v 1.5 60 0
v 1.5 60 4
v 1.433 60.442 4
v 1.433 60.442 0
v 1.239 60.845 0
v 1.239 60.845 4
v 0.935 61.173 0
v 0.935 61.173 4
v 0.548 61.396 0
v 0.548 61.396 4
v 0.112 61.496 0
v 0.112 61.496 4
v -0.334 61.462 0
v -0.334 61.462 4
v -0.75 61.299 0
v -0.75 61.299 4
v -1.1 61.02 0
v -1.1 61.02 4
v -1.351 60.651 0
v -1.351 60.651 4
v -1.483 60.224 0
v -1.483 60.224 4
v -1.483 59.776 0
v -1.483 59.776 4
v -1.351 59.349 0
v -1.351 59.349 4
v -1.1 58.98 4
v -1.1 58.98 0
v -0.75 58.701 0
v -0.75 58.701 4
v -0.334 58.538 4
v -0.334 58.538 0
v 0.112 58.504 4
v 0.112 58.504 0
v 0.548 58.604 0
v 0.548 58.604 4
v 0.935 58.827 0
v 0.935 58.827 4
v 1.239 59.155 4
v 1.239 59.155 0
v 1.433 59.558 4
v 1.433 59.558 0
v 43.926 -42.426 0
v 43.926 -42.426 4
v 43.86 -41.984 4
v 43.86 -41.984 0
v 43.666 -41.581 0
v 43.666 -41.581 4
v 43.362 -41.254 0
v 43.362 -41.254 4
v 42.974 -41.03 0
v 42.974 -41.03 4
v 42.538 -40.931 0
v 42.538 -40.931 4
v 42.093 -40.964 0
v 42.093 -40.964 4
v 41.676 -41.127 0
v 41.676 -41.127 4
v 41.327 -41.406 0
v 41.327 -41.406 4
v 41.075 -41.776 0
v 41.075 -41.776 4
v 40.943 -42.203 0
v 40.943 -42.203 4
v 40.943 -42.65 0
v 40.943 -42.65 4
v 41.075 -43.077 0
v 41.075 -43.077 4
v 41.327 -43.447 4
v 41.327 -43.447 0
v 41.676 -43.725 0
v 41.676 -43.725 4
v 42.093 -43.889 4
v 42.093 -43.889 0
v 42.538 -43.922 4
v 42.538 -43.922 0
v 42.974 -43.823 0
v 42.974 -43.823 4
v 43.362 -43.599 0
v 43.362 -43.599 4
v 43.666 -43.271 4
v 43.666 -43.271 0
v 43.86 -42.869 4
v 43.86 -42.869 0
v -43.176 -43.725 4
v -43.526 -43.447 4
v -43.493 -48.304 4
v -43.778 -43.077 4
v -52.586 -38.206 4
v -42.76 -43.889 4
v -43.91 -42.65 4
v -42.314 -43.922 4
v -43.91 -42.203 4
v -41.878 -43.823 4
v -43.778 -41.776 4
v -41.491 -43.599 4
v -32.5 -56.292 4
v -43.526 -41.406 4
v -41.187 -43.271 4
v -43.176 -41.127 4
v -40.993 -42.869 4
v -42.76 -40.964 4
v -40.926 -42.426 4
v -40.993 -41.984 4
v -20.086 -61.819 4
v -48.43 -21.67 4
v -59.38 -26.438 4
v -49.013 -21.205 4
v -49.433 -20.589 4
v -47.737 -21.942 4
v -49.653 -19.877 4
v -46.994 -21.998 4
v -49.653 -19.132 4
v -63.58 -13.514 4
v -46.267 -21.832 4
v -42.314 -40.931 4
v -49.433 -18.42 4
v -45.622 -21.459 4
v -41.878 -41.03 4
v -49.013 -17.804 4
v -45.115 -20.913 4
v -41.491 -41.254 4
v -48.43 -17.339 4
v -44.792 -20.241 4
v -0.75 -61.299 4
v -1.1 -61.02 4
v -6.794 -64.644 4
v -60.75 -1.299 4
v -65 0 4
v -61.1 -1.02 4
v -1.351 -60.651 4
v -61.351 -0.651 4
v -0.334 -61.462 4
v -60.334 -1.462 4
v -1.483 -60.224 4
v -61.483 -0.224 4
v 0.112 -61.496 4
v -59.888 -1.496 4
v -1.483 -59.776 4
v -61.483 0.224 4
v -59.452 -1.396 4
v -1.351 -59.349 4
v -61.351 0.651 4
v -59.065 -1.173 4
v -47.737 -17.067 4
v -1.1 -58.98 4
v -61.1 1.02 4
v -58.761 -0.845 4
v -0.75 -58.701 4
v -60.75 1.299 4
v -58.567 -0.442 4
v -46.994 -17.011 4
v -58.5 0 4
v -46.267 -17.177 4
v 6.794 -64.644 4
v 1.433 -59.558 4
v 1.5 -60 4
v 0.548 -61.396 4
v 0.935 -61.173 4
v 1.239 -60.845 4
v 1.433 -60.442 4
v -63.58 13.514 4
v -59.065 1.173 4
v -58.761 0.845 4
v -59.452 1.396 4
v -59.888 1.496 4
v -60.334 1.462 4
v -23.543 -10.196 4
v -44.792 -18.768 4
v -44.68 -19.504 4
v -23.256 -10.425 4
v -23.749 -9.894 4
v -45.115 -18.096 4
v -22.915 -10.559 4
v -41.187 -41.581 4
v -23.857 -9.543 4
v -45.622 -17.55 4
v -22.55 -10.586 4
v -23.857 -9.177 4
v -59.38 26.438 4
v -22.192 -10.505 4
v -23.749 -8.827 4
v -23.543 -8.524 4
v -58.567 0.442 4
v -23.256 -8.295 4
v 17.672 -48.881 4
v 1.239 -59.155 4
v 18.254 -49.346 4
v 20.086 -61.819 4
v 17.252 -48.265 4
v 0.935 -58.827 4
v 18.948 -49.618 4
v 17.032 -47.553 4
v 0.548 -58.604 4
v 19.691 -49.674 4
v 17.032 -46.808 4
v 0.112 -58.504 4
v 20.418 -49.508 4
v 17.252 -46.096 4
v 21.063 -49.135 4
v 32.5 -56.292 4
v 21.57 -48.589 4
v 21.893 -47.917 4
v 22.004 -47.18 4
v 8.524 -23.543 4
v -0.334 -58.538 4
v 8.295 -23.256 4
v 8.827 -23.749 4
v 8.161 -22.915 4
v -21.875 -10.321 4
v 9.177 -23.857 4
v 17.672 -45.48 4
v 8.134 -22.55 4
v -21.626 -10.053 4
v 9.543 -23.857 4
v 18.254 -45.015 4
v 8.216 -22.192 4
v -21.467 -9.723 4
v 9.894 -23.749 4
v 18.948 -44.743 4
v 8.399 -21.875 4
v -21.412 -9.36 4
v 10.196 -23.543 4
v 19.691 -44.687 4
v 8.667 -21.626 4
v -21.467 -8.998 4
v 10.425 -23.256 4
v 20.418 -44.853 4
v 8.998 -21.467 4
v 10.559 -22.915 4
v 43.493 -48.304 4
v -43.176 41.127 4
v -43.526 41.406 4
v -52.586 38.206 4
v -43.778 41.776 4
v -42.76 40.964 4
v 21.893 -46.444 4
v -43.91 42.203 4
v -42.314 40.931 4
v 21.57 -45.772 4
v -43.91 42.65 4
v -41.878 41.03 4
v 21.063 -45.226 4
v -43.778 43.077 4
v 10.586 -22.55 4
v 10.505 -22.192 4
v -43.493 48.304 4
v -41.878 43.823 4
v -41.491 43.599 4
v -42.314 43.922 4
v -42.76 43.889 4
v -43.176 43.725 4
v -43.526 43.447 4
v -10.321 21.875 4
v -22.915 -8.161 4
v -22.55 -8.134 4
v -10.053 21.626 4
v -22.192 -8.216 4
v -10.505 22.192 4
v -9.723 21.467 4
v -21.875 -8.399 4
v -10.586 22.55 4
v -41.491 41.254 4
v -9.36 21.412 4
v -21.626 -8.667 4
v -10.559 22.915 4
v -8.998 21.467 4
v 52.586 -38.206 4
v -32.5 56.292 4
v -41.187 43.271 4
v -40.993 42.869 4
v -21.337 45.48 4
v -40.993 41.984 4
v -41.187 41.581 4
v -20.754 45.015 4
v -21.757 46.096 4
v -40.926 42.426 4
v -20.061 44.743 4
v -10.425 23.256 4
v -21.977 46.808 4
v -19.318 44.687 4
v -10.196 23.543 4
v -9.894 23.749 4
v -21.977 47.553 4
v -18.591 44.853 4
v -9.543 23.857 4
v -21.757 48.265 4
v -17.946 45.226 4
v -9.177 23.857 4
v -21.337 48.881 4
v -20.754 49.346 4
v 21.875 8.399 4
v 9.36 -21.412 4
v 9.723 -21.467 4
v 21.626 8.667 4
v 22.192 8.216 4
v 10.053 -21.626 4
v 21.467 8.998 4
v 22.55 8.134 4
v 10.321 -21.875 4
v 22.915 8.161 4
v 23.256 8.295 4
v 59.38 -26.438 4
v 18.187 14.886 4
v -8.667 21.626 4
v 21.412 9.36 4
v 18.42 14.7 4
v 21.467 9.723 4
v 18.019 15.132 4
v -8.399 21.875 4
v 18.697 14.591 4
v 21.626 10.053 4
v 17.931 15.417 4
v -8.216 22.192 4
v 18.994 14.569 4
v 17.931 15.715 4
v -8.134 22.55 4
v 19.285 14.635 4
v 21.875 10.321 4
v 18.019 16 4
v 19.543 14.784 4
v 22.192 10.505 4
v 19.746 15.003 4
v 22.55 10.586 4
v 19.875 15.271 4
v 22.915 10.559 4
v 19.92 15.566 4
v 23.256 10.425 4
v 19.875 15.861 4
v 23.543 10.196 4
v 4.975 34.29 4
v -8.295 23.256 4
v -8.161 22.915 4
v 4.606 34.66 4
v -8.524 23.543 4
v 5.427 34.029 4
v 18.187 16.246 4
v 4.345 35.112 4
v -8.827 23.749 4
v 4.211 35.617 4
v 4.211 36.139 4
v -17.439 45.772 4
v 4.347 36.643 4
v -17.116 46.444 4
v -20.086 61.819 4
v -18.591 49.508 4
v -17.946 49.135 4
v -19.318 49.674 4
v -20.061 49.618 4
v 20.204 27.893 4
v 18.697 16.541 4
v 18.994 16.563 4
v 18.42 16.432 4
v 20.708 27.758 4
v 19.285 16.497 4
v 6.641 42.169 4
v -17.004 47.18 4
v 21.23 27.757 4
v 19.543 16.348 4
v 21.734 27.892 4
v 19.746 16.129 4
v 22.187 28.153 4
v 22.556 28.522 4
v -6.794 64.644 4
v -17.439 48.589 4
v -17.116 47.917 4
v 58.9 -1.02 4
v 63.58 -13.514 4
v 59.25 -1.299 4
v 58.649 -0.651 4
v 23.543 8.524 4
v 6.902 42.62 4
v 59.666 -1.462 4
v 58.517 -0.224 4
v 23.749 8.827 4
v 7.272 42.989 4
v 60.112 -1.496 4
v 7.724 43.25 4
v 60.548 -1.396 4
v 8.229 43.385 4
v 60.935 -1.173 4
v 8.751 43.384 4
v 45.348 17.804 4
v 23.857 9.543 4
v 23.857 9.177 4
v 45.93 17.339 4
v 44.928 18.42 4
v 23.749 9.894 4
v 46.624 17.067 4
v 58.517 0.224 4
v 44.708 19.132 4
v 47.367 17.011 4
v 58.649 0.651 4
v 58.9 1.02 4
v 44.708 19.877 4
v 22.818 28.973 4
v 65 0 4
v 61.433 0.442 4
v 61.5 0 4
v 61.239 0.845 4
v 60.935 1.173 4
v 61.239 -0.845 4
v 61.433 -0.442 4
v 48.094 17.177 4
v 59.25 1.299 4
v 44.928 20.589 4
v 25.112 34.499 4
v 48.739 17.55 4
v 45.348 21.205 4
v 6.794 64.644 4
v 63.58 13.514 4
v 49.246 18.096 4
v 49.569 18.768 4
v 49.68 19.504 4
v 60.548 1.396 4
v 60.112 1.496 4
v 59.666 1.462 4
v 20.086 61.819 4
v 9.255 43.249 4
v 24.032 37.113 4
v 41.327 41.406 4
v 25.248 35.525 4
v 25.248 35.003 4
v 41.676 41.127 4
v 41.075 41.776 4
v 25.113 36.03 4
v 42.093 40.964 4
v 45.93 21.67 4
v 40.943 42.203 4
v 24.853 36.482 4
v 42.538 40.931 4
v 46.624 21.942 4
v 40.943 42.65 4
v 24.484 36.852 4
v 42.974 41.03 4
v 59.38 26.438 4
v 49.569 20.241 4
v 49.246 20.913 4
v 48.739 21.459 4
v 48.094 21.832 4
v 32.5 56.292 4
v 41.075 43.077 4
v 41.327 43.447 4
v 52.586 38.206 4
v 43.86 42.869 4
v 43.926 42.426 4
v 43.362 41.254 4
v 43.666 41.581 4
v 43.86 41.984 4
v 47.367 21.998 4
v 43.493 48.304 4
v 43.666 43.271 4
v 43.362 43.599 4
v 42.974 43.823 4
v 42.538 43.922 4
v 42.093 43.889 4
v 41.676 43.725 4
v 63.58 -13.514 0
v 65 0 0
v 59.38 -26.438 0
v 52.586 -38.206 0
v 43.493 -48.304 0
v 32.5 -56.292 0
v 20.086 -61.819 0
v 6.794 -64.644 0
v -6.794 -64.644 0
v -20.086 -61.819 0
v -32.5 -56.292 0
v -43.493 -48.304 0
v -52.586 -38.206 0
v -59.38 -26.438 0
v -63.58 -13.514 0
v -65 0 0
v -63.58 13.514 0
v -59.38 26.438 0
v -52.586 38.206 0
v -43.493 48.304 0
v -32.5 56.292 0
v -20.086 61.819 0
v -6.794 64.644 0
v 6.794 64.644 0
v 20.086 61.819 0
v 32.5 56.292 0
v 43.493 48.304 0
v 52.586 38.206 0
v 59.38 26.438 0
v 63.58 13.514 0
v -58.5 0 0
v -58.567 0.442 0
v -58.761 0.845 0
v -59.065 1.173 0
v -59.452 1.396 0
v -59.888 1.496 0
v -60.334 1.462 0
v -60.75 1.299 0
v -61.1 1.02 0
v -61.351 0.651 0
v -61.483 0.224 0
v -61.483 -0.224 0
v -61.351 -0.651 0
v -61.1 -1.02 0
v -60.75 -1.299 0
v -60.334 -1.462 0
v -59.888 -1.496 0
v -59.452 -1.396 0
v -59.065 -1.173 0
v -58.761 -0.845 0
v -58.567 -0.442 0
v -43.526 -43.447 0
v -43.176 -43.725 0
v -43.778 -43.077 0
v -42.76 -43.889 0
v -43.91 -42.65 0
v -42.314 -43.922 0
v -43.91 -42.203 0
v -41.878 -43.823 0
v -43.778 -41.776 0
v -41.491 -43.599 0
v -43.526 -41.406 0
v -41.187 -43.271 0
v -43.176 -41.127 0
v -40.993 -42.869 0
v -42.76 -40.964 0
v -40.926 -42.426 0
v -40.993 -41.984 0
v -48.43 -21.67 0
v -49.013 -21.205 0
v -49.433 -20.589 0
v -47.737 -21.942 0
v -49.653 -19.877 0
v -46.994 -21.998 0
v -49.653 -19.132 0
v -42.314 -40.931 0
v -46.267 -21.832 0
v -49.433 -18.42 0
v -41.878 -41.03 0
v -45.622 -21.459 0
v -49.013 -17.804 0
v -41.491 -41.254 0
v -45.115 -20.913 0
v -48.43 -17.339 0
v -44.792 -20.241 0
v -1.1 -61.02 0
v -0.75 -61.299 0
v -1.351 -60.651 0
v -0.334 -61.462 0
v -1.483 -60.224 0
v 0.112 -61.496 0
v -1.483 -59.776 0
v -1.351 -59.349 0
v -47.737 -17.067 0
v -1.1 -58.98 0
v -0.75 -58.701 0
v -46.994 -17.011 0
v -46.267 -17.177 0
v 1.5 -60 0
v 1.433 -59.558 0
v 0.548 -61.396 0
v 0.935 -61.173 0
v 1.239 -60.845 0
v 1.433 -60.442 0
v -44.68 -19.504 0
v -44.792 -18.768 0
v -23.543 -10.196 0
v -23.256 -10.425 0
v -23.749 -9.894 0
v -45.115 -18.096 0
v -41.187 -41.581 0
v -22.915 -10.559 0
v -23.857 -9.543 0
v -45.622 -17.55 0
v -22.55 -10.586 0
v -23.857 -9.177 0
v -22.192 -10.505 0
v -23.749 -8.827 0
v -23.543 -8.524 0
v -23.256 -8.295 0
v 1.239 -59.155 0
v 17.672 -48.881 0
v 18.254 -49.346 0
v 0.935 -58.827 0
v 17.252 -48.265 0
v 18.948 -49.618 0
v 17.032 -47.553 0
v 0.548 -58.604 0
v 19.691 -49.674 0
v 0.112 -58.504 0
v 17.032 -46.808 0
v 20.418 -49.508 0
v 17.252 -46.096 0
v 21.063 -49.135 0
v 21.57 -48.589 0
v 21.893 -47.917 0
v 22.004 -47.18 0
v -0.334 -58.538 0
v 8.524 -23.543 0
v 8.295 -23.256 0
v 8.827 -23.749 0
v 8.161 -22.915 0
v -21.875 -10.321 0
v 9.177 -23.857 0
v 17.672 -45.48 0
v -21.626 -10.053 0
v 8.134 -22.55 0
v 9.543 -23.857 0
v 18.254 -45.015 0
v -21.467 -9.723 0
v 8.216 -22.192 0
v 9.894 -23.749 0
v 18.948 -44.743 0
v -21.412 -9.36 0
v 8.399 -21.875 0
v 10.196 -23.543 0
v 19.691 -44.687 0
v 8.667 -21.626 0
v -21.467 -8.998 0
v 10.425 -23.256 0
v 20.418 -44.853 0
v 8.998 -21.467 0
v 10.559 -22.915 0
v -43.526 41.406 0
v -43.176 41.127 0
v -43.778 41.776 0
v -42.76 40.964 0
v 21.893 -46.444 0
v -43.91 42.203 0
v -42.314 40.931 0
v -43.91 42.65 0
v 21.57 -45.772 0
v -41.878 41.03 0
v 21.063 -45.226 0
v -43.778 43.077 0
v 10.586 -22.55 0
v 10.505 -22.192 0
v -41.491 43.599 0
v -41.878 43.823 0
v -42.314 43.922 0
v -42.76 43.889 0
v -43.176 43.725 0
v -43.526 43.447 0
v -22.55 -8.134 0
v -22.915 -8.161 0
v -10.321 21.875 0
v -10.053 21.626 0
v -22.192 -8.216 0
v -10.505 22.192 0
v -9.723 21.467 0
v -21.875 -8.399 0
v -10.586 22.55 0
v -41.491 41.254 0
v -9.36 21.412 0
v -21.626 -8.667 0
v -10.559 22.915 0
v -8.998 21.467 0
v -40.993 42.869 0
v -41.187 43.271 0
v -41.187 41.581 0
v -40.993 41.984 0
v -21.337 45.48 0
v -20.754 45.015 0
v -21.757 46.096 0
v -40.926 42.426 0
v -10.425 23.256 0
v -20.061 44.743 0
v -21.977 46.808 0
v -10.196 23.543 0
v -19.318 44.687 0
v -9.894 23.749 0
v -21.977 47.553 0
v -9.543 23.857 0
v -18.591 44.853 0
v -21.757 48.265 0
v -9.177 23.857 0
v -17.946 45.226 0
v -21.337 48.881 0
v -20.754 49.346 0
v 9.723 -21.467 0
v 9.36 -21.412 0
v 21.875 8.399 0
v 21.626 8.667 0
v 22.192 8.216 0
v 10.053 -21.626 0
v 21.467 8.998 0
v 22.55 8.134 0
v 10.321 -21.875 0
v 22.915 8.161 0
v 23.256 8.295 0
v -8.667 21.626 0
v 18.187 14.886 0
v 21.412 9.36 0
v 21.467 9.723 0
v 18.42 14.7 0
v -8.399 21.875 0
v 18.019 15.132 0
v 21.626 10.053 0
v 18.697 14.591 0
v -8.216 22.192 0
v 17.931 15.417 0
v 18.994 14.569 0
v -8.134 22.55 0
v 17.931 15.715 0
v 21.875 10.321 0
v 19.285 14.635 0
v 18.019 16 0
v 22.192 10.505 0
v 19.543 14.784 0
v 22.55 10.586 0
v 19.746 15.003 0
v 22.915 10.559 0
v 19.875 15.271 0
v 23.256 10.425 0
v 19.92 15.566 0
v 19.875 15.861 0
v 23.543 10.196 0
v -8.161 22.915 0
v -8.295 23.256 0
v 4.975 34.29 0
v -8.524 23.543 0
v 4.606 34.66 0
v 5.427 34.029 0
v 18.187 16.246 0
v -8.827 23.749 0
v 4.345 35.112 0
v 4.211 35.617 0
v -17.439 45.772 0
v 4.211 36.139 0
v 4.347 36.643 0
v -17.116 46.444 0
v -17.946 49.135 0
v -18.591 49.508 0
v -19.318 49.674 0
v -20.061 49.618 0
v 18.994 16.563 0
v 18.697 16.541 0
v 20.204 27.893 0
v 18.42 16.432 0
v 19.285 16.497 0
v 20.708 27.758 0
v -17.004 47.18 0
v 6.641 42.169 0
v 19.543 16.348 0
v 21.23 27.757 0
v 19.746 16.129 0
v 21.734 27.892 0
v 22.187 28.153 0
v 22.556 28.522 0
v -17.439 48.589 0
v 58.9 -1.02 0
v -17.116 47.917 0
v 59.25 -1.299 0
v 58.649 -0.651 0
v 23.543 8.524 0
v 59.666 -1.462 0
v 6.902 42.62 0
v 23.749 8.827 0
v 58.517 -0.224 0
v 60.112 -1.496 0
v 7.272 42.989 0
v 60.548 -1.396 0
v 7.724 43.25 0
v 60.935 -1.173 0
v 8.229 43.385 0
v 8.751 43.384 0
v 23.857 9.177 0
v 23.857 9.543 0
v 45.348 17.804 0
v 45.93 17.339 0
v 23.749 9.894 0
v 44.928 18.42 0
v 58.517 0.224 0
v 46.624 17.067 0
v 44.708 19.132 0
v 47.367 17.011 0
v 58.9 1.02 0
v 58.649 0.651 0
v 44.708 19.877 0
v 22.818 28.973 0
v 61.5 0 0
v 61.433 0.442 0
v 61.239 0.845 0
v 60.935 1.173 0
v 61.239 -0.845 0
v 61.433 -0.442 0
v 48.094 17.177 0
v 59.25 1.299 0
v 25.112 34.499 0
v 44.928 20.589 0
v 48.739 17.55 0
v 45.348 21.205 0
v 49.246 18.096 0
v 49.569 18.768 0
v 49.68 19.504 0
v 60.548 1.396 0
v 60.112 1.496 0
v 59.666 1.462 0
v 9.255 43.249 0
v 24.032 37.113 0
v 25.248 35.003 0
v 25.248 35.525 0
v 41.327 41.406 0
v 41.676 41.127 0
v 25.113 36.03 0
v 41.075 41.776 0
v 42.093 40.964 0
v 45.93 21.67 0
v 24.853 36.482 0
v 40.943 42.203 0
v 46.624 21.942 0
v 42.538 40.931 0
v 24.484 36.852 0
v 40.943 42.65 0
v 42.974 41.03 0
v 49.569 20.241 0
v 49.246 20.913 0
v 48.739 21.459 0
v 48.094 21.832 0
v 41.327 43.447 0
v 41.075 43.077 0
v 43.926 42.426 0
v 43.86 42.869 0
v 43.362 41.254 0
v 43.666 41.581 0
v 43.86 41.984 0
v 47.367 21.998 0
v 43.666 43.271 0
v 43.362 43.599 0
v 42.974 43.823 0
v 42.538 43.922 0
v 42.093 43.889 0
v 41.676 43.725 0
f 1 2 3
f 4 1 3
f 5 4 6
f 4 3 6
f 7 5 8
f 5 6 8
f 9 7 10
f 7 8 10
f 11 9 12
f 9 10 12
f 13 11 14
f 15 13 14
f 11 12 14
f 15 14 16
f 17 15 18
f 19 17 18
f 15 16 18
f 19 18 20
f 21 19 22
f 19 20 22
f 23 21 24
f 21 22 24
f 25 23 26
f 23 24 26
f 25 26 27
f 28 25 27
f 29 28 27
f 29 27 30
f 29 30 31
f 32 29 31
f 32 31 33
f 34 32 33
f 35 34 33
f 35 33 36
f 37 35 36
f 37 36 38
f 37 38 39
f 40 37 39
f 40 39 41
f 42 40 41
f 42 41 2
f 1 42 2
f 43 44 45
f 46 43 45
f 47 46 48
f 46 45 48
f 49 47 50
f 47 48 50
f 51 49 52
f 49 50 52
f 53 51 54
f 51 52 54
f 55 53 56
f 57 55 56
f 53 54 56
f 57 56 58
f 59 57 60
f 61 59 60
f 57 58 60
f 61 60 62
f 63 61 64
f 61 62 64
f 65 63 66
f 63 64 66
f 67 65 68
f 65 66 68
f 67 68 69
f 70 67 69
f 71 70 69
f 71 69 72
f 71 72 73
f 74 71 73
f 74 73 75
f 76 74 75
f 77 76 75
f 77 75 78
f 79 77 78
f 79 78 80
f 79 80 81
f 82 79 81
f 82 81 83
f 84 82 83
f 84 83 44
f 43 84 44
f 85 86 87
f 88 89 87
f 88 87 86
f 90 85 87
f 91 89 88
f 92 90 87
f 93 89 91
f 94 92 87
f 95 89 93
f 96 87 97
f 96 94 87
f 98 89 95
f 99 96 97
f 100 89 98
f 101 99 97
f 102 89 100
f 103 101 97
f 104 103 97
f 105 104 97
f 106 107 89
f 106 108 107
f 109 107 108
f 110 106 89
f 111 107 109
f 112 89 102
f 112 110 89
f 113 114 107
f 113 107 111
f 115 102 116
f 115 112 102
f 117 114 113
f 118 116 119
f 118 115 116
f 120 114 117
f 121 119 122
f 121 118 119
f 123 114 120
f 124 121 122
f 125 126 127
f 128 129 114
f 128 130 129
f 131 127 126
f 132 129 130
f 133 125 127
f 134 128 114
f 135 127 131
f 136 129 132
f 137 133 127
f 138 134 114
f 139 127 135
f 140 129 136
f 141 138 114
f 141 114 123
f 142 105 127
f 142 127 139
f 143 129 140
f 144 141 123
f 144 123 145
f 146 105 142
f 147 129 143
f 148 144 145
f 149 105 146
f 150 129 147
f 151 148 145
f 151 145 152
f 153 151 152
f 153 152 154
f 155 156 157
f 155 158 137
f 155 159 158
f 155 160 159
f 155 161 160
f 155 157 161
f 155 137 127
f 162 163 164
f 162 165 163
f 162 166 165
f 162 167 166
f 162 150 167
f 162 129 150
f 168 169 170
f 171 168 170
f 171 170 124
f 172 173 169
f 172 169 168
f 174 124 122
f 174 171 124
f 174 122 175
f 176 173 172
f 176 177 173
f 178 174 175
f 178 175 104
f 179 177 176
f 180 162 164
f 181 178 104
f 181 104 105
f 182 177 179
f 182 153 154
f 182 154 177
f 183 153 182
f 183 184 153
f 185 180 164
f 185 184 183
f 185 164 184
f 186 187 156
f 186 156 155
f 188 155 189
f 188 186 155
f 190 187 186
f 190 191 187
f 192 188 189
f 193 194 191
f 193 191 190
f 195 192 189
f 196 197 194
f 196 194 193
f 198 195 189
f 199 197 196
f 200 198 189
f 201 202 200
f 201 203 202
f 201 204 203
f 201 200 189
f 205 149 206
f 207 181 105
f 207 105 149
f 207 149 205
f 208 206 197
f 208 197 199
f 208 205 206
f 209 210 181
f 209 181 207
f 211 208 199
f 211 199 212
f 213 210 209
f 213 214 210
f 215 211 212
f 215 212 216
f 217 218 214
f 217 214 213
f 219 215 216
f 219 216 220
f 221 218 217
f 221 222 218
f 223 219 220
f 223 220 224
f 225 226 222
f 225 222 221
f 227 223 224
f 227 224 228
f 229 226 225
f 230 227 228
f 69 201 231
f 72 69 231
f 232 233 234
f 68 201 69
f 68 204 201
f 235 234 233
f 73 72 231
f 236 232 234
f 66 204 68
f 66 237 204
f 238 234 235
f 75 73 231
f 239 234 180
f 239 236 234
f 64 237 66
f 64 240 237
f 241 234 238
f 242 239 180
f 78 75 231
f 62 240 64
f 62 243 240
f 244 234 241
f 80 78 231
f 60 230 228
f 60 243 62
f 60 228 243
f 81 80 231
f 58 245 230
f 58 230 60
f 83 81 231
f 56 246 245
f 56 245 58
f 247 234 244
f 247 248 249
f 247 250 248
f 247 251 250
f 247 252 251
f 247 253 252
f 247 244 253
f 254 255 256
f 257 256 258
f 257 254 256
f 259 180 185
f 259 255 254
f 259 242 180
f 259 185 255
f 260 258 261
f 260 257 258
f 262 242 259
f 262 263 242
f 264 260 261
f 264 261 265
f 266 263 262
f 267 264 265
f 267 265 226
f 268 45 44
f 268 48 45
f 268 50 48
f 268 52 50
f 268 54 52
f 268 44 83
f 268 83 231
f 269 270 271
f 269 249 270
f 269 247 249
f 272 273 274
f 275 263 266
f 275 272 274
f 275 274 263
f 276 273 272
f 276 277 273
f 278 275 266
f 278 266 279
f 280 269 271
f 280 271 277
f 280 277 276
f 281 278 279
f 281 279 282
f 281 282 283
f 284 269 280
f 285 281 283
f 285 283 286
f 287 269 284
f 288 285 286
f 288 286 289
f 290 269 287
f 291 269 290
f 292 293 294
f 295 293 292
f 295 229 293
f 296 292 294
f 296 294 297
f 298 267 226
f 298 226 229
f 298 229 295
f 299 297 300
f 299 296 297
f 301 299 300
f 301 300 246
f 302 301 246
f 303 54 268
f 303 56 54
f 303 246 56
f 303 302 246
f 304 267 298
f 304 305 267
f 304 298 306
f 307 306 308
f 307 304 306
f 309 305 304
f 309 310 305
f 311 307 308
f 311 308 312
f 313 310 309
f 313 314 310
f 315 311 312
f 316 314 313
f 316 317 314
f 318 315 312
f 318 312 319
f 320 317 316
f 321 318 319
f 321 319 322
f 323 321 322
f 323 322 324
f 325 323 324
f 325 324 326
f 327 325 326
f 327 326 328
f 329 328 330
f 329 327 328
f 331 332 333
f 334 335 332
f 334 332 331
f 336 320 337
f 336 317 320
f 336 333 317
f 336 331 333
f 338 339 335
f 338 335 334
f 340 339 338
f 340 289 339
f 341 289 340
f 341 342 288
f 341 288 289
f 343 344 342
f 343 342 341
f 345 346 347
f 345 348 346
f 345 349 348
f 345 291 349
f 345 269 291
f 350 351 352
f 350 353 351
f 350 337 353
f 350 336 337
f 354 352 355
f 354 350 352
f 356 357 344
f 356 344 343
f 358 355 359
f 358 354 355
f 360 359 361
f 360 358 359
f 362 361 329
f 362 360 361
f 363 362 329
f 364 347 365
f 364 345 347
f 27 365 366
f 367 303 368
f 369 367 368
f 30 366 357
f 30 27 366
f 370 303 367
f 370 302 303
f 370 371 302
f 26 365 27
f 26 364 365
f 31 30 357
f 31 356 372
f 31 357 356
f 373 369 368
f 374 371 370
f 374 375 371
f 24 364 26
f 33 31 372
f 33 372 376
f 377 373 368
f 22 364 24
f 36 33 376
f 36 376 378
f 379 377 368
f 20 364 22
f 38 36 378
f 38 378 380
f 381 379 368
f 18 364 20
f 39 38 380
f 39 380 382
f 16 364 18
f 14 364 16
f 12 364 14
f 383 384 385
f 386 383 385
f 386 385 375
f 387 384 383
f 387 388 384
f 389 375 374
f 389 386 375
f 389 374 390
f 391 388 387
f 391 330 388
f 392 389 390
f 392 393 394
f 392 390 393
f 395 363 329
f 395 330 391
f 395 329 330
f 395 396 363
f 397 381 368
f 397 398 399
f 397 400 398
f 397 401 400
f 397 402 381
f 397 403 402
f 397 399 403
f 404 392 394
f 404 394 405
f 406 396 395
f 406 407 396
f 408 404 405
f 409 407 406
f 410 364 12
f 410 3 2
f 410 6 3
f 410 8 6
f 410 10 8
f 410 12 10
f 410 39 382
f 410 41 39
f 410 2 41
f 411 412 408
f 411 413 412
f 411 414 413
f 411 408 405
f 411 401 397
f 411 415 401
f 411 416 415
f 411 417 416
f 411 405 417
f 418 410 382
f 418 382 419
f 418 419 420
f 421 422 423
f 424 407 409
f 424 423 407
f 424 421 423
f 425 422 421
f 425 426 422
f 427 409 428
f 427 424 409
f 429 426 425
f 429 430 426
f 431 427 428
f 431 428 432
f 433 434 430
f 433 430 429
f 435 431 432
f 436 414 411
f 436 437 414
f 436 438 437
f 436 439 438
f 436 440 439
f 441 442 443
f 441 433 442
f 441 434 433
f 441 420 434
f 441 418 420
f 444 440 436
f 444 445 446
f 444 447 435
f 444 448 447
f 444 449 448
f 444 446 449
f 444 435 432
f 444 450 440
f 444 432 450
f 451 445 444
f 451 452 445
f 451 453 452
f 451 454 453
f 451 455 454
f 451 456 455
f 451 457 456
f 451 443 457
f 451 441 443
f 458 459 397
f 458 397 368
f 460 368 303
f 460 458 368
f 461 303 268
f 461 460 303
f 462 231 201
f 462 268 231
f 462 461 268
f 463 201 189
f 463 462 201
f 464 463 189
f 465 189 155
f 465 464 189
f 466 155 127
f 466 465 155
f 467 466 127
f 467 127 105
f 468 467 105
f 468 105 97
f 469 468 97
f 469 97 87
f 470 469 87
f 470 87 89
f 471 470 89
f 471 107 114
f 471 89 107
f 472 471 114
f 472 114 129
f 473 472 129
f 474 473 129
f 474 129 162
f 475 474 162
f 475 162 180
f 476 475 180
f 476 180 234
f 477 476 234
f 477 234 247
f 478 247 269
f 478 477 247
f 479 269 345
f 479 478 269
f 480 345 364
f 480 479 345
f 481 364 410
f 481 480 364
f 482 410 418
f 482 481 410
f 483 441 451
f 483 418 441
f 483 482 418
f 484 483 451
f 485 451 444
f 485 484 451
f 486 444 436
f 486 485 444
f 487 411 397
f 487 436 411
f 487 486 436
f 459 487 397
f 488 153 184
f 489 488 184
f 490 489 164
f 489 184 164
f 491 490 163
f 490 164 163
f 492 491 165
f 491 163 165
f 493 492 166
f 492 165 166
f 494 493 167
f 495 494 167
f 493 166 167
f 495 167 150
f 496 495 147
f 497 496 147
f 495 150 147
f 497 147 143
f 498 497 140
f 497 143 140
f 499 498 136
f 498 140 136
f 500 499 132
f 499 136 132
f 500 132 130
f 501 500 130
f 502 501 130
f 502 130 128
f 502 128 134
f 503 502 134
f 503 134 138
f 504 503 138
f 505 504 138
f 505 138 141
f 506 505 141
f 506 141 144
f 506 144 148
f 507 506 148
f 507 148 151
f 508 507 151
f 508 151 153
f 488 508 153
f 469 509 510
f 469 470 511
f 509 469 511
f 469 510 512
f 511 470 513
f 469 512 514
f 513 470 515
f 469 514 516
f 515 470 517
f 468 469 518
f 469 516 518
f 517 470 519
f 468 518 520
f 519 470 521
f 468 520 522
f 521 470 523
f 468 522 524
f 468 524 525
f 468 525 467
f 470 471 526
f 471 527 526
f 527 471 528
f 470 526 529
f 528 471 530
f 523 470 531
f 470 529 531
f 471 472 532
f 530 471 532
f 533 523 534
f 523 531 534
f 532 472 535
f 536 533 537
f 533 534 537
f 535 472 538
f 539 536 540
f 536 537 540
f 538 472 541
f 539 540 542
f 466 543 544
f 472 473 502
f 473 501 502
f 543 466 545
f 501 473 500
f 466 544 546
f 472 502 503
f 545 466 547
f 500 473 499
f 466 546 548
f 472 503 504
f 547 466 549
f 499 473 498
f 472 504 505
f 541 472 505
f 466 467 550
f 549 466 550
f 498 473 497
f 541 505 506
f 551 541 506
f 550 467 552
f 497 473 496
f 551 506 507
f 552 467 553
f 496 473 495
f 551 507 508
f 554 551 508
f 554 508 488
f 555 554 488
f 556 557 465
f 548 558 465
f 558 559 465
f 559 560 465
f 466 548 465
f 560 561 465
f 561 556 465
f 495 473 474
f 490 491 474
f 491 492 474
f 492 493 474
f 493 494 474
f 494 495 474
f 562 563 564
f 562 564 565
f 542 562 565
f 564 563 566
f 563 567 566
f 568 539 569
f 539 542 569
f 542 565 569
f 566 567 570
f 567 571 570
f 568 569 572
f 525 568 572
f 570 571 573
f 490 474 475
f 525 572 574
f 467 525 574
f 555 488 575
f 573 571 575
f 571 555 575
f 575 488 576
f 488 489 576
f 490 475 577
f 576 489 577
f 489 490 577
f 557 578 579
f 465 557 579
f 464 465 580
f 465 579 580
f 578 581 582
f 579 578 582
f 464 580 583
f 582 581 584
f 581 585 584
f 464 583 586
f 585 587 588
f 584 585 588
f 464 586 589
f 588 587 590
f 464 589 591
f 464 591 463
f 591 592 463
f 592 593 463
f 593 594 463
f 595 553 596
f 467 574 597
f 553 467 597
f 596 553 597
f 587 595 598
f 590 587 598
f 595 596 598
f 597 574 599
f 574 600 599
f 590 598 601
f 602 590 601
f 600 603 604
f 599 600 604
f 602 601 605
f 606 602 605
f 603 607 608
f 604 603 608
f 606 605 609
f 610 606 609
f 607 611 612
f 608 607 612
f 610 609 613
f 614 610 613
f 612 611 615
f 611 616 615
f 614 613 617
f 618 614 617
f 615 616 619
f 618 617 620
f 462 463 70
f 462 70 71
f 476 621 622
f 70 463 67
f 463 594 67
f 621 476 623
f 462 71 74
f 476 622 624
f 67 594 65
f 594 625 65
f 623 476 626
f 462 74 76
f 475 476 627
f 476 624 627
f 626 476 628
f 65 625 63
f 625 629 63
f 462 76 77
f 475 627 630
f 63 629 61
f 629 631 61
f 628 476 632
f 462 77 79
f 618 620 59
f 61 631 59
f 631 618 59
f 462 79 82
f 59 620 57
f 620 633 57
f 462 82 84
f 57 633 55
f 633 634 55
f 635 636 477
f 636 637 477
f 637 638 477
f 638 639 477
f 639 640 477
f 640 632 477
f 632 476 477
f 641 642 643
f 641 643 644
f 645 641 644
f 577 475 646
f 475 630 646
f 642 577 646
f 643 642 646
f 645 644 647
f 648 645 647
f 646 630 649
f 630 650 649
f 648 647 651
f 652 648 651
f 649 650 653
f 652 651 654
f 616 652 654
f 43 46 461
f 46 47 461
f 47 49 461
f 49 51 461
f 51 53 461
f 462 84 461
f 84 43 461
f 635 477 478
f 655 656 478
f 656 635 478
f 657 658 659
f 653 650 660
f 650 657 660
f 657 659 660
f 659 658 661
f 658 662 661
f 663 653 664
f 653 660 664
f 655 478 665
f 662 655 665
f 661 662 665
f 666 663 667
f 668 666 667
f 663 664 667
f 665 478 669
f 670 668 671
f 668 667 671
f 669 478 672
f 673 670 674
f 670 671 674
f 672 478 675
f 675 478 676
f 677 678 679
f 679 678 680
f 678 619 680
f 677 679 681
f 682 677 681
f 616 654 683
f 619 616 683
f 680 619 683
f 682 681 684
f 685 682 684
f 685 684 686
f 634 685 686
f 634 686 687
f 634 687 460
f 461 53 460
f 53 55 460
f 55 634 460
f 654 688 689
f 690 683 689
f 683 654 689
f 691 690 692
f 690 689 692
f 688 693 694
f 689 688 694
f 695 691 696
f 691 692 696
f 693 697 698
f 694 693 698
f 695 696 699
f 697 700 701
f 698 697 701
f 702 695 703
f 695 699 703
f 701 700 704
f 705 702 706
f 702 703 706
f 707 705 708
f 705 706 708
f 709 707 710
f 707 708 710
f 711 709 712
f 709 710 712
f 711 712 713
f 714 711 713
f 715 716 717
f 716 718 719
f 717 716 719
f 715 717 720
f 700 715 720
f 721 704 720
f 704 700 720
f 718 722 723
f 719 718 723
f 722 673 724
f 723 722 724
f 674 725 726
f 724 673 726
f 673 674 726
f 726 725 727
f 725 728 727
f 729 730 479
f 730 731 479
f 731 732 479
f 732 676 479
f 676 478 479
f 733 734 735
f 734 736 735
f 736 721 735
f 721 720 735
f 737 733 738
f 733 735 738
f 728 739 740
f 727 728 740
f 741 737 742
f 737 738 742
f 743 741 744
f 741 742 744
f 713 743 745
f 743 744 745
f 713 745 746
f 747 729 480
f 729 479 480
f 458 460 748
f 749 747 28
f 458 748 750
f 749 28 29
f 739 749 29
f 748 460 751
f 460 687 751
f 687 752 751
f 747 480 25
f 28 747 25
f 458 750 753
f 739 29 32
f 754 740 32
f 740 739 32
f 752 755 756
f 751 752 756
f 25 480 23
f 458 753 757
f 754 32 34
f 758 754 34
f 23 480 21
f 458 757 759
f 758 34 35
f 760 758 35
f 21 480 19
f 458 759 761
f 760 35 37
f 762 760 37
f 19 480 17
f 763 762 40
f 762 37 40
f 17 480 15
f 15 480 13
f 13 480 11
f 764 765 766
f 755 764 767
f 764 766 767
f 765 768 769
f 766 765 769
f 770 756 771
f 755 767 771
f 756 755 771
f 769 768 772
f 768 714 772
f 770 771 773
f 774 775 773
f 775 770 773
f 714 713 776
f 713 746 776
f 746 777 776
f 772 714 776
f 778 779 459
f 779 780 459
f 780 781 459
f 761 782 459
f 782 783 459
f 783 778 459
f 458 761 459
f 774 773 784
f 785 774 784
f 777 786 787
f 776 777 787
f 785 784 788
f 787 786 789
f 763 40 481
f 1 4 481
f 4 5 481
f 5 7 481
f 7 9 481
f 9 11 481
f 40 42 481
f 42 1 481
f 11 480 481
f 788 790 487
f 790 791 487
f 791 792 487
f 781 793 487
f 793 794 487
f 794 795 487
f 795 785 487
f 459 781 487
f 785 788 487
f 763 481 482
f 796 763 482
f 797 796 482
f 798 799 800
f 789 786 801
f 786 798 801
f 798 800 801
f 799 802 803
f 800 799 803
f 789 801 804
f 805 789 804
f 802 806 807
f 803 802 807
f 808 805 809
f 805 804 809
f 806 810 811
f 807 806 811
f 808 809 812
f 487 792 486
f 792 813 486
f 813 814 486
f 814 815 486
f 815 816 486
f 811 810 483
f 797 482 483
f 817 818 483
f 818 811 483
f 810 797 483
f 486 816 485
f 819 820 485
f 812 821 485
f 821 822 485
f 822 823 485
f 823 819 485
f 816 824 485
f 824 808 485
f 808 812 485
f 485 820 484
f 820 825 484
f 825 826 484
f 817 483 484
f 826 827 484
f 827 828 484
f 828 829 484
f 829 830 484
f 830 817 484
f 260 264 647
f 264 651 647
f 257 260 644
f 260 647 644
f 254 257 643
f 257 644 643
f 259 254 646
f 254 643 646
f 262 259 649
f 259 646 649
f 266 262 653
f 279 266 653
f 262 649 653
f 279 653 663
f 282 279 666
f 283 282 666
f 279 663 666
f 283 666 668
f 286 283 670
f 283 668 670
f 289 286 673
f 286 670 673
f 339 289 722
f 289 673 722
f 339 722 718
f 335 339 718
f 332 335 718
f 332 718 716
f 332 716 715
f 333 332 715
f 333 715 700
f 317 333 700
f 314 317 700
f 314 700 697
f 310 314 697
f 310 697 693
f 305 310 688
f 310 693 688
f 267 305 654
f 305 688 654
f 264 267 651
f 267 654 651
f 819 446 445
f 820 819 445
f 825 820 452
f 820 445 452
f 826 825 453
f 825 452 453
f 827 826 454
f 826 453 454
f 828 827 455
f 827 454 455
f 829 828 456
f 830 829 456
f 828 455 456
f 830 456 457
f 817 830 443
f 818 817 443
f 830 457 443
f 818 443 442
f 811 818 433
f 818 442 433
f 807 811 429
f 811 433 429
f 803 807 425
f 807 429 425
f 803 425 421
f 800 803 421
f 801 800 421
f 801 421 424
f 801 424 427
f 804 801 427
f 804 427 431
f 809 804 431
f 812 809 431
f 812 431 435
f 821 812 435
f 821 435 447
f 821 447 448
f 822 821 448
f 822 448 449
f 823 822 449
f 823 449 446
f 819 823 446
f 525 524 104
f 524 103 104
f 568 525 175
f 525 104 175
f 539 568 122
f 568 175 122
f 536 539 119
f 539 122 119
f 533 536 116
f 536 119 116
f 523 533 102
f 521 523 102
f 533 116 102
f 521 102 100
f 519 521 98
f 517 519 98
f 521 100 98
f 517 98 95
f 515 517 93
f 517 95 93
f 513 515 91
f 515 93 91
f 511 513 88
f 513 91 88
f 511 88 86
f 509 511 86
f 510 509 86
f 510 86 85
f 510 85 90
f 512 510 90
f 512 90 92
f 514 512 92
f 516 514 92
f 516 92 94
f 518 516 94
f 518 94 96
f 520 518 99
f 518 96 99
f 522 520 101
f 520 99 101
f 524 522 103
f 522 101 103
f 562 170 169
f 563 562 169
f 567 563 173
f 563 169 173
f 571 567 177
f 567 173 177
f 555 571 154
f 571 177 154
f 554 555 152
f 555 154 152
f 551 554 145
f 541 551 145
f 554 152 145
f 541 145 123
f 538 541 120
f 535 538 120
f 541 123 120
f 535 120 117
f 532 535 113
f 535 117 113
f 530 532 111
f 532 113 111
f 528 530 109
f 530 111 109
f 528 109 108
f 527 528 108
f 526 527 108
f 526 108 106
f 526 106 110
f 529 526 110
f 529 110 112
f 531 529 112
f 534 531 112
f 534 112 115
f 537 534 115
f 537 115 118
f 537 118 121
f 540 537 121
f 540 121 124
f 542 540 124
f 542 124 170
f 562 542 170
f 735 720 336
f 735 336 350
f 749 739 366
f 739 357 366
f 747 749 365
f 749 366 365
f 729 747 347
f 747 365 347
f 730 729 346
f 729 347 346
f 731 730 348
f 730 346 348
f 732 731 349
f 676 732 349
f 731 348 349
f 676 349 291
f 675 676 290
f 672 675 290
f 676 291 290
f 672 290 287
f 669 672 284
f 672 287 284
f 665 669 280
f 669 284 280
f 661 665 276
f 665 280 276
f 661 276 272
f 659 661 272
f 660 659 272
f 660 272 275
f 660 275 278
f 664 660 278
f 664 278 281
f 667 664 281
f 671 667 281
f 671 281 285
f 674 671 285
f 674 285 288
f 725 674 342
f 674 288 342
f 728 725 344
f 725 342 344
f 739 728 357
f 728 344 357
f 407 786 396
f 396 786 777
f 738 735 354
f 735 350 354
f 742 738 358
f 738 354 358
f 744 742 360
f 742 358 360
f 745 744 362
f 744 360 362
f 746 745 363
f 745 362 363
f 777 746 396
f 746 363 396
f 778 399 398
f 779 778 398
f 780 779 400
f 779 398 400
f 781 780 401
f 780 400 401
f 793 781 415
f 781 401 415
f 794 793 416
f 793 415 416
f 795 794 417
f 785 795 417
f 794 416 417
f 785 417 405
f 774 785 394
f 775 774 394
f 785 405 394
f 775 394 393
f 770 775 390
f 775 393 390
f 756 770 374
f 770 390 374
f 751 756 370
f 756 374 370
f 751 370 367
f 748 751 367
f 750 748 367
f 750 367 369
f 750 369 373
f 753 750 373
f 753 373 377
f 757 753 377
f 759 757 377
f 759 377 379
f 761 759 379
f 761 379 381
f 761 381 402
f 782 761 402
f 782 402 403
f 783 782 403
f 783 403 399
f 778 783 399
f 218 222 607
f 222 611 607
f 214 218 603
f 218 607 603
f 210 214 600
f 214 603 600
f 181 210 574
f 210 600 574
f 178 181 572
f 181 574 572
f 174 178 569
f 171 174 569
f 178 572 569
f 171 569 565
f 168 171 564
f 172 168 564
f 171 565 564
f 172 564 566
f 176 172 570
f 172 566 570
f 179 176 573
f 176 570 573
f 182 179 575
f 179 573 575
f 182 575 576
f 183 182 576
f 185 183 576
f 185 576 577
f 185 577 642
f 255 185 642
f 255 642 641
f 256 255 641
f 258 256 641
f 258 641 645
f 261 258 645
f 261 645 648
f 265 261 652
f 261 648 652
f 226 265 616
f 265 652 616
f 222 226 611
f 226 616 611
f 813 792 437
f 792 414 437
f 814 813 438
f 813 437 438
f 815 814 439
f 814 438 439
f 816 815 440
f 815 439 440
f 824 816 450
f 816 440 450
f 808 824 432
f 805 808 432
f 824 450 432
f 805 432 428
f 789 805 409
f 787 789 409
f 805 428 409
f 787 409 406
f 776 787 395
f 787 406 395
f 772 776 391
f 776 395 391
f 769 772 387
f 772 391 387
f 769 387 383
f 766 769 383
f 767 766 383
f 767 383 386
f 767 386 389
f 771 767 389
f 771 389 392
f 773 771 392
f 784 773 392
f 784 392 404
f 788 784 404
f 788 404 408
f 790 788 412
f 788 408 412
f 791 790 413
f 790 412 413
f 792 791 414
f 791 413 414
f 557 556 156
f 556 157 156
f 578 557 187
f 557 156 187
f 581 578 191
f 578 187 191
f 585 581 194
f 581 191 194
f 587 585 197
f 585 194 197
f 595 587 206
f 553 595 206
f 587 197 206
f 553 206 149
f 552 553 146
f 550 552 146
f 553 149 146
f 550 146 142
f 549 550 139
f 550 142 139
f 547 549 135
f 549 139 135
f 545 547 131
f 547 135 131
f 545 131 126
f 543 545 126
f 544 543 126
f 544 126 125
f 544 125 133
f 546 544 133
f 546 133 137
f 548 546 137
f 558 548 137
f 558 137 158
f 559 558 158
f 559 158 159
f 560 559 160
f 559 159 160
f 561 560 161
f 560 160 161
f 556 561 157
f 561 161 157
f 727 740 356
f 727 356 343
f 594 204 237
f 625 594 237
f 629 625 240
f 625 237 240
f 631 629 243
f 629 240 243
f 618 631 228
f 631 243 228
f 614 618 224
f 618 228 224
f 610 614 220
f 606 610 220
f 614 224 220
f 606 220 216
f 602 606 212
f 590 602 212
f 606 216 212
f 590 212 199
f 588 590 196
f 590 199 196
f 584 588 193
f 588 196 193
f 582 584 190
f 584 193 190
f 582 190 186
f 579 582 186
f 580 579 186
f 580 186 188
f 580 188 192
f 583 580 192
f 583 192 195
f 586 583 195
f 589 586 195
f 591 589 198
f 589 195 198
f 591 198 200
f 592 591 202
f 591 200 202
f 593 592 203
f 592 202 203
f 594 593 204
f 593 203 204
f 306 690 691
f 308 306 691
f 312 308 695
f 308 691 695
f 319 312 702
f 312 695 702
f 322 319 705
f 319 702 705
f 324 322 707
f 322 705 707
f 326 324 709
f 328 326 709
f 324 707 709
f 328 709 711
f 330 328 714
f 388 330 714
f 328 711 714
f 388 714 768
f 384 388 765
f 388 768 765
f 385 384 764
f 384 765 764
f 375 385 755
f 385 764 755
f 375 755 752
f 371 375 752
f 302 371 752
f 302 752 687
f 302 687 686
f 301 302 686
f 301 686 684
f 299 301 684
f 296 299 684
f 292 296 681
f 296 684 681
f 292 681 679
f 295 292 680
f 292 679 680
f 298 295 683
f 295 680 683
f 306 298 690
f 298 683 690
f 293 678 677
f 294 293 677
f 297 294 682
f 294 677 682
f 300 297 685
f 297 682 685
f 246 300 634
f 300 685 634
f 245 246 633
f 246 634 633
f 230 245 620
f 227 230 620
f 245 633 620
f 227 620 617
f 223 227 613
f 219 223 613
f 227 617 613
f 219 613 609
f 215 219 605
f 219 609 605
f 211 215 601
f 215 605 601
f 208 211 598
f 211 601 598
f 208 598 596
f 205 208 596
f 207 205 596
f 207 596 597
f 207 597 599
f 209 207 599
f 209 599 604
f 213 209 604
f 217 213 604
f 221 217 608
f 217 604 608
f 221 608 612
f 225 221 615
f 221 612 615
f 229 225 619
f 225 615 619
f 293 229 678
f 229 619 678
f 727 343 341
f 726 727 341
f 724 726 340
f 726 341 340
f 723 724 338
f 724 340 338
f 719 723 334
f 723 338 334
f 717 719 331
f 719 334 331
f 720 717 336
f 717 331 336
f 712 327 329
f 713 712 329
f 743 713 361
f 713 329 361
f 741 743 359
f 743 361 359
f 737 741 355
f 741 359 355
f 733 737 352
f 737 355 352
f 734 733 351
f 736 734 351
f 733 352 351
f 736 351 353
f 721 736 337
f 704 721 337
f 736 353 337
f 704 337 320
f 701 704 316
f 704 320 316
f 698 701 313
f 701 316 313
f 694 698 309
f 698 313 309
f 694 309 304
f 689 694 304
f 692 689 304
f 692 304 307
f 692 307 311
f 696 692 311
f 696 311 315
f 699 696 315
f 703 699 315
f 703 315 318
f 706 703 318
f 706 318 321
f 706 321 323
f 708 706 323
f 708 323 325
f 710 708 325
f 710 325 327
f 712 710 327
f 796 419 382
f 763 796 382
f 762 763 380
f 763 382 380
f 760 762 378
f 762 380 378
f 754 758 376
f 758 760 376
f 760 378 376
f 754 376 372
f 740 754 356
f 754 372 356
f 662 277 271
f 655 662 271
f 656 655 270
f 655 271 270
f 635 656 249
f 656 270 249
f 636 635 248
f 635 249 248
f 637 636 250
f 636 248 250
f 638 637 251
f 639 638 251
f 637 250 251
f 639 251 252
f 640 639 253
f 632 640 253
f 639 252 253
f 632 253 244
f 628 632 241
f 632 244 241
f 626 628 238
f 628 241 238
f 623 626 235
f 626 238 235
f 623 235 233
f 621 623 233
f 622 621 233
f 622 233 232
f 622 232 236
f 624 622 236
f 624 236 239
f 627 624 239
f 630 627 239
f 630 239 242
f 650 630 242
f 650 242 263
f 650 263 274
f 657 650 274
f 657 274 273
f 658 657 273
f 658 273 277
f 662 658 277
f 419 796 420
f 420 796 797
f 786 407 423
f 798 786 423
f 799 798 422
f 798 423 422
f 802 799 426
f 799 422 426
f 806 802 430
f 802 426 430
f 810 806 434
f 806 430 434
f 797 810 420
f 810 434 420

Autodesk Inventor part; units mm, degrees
ref_plane "YZ Plane" through (0, 0, 0) normal (1, 0, 0) x (0, 1, 0)
ref_plane "XZ Plane" through (0, 0, 0) normal (0, 1, 0) x (-1, 0, 0)
ref_plane "XY Plane" through (0, 0, 0) normal (0, 0, 1) x (1, 0, 0)
sketch "스케치1" plane through (0, 0, 0) normal (0, 0, 1) x (1, 0, 0)
  line L0 (-18, -16) -> (-18, 16)
  line L1 (-18, 16) -> (18, 16)
  line L2 (18, 16) -> (18, -16)
  line L3 (18, -16) -> (-18, -16)
  circle A0 centre (36.125, 36.075) radius 2.5
  circle A1 centre (-36.125, -36.075) radius 2.5
  circle A2 centre (36.075, -36.125) radius 2.5
  circle A3 centre (-36.075, 36.125) radius 2.5
  arc A4 (-39.6581, -32.537) -> (-32.5919, -39.613) centre (-36.125, -36.075) ccw
  line L4 (-32.5919, -39.613) -> (-17.9206, -24.962)
  arc A5 (-14.3876, -23.5) -> (-17.9206, -24.962) centre (-14.3876, -28.5) ccw
  line L5 (-14.3876, -23.5) -> (14.3282, -23.5)
  arc A6 (17.8662, -24.9669) -> (14.3282, -23.5) centre (14.3282, -28.5) ccw
  line L6 (17.8662, -24.9669) -> (32.537, -39.6581)
  arc A7 (32.537, -39.6581) -> (39.613, -32.5919) centre (36.075, -36.125) ccw
  line L7 (39.613, -32.5919) -> (24.962, -17.9206)
  arc A8 (23.5, -14.3876) -> (24.962, -17.9206) centre (28.5, -14.3876) ccw
  line L8 (23.5, -14.3876) -> (23.5, 14.3282)
  arc A9 (24.9669, 17.8662) -> (23.5, 14.3282) centre (28.5, 14.3282) ccw
  line L9 (24.9669, 17.8662) -> (39.6581, 32.537)
  arc A10 (39.6581, 32.537) -> (32.5919, 39.613) centre (36.125, 36.075) ccw
  line L10 (32.5919, 39.613) -> (17.9206, 24.962)
  arc A11 (14.3876, 23.5) -> (17.9206, 24.962) centre (14.3876, 28.5) ccw
  line L11 (14.3876, 23.5) -> (-14.3282, 23.5)
  arc A12 (-17.8662, 24.9669) -> (-14.3282, 23.5) centre (-14.3282, 28.5) ccw
  line L12 (-17.8662, 24.9669) -> (-32.537, 39.6581)
  arc A13 (-32.537, 39.6581) -> (-39.613, 32.5919) centre (-36.075, 36.125) ccw
  line L13 (-39.613, 32.5919) -> (-24.962, 17.9206)
  arc A14 (-23.5, 14.3876) -> (-24.962, 17.9206) centre (-28.5, 14.3876) ccw
  line L14 (-23.5, 14.3876) -> (-23.5, -14.3282)
  arc A15 (-24.9669, -17.8662) -> (-23.5, -14.3282) centre (-28.5, -14.3282) ccw
  line L15 (-24.9669, -17.8662) -> (-39.6581, -32.537)
  circle A16 centre (0, 0) radius 65
  dimension "d38" = 72.2
  dimension "d39" = 72.2
  dimension "d62" = 130
extrude "돌출3" add sketch "스케치1" along normal blind 4 contours L0 L1 L2 L3 | A0 | A1 | A2 | A3 | L15 A15 L14 A14 L13 A13 L12 A12 L11 A11 L10 A10 L9 A9 L8 A8 L7 A7 L6 A6 L5 A5 L4 A4 | A16
sketch "스케치6" plane through (0, 0, 4) normal (0, 0, 1) x (1, 0, 0)
  line L0 (0, 0) -> (60.0652, -60.0652) construction
  line L1 (0, 0) -> (84.945, 0) construction
  circle A0 centre (42.4264, -42.4264) radius 1.5
  circle A1 centre (0, 0) radius 60 construction
  circle A2 centre (0, 0) radius 60 construction
  circle A3 centre (60, 0) radius 1.5
  circle A4 centre (0, 0) radius 60 construction
  circle A5 centre (42.4264, 42.4264) radius 1.5
  circle A6 centre (0, 0) radius 60 construction
  circle A7 centre (0, 60) radius 1.5
  circle A8 centre (0, 0) radius 60 construction
  circle A9 centre (-42.4264, 42.4264) radius 1.5
  circle A10 centre (0, 0) radius 60 construction
  circle A11 centre (-60, 0) radius 1.5
  circle A12 centre (0, 0) radius 60 construction
  circle A13 centre (-42.4264, -42.4264) radius 1.5
  circle A14 centre (0, 0) radius 60 construction
  circle A15 centre (0, -60) radius 1.5
  circle A16 centre (0, 0) radius 65 projected
  dimension "d65" = 120
  dimension "d63" = 45
  dimension "d64" = 3
  dimension "d68" = 360
  dimension "d72" = 130
extrude "돌출4" cut sketch "스케치6" against normal through all contours A0 | A3 | A5 | A7 | A9 | A11 | A13 | A15
sketch "스케치7" plane through (0, 0, 4) normal (0, 0, 1) x (1, 0, 0)
  circle A0 centre (-36.075, 36.125) radius 2.5 projected
  circle A1 centre (36.075, -36.125) radius 2.5 projected
  circle A2 centre (-36.125, -36.075) radius 2.5 projected
  circle A3 centre (36.125, 36.075) radius 2.5 projected
  circle A4 centre (-42.4264, -42.4264) radius 1.5 projected
  circle A5 centre (-42.4264, 42.4264) radius 1.5 projected
  circle A6 centre (42.4264, 42.4264) radius 1.5 projected
  circle A7 centre (42.4264, -42.4264) radius 1.5 projected
  circle A8 centre (60, 0) radius 1.5 projected
  circle A9 centre (0, 60) radius 1.5 projected
  circle A10 centre (-60, 0) radius 1.5 projected
  circle A11 centre (0, -60) radius 1.5 projected
  circle A12 centre (-42.4264, -42.4264) radius 1.5 projected
  circle A13 centre (-42.4264, 42.4264) radius 1.5 projected
  circle A14 centre (42.4264, 42.4264) radius 1.5 projected
  circle A15 centre (42.4264, -42.4264) radius 1.5 projected
  circle A16 centre (60, 0) radius 1.5 projected
  circle A17 centre (0, 60) radius 1.5 projected
  circle A18 centre (-60, 0) radius 1.5 projected
  circle A19 centre (0, -60) radius 1.5 projected
  circle A20 centre (0, 0) radius 65 projected
  circle A21 centre (-36.075, 36.125) radius 2.5
  circle A22 centre (36.125, 36.075) radius 2.5
  circle A23 centre (-36.125, -36.075) radius 2.5
  circle A24 centre (36.075, -36.125) radius 2.5
  circle A25 centre (-47.1805, -19.5045) radius 2.5
  circle A26 centre (19.5045, -47.1805) radius 2.5
  circle A27 centre (47.1805, 19.5045) radius 2.5
  circle A28 centre (-19.5045, 47.1805) radius 2.5
  dimension "d76" = 67.5
extrude "돌출5" cut sketch "스케치7" against normal through all contours A25 | A26 | A27 | A28
sketch "스케치8" plane through (0, 0, 4) normal (0, 0, 1) x (1, 0, 0)
  circle A0 centre (-19.5045, 47.1805) radius 2.5 projected
  circle A1 centre (0, 0) radius 65 projected
  circle A2 centre (0, 0) radius 24.5 construction
  line L0 (0, 0) -> (-19.5045, 47.1805) construction
  point P0 (-9.3601, 22.6415)
  dimension "d80" = 49
hole "구멍5" at (-9.3601, 22.6415, 4) direction (0, 0, -1) diameter 2.459 end through all thread size "M3x0.5" class "6H" standard "ISO Metric profile"
pattern_circular "원형 패턴1" count 4 over 360 about axis through (0, 0, 0) along (0, 0, 1) of "구멍5"
sketch "스케치9" plane through (0, 0, 0) normal (0, 0, -1) x (-1, 0, 0)
  circle A0 centre (42.4264, 42.4264) radius 1.5 projected
  circle A1 centre (0, 60) radius 1.5 projected
  circle A2 centre (-42.4264, 42.4264) radius 1.5 projected
  circle A3 centre (-60, 0) radius 1.5 projected
  circle A4 centre (-42.4264, -42.4264) radius 1.5 projected
  circle A5 centre (0, -60) radius 1.5 projected
  circle A6 centre (42.4264, -42.4264) radius 1.5 projected
  circle A7 centre (60, 0) radius 1.5 projected
  circle A8 centre (18.5456, 40.1536) radius 1.5 projected
  circle A9 centre (-41.5066, 15.2792) radius 1.5 projected
  circle A10 centre (41.5066, -15.2792) radius 1.5 projected
  circle A11 centre (-18.5456, -40.1536) radius 1.5 projected
  circle A12 centre (0, 0) radius 65 projected
  line L0 (-4.3465, 36.6246) -> (-6.6426, 42.1678) projected
  line L1 (-9.2557, 43.2502) -> (-24.0378, 37.1273) projected
  line L2 (-25.1202, 34.5142) -> (-22.8241, 28.9709) projected
  arc A13 (-37.7646, 20.6175) -> (-38.847, 18.0044) centre (-36.9993, 18.7698) ccw projected
  line L3 (-38.847, 18.0044) -> (-37.699, 15.2327) projected
  arc A14 (-38.7814, 12.6196) -> (-37.699, 15.2327) centre (-39.5467, 14.4674) ccw projected
  line L4 (-38.7814, 12.6196) -> (-41.553, 11.4716) projected
  arc A15 (-41.553, 11.4716) -> (-42.6354, 8.8584) centre (-40.7876, 9.6238) ccw projected
  line L5 (-42.6354, 8.8584) -> (-23.8839, -36.4117) projected
  arc A16 (-23.8839, -36.4117) -> (-21.2708, -37.494) centre (-22.0362, -35.6463) ccw projected
  line L6 (-21.2708, -37.494) -> (-18.4992, -36.346) projected
  arc A17 (-15.886, -37.4284) -> (-18.4992, -36.346) centre (-17.7338, -38.1938) ccw projected
  line L7 (-15.886, -37.4284) -> (-14.738, -40.2) projected
  arc A18 (-14.738, -40.2) -> (-12.1249, -41.2824) centre (-12.8902, -39.4347) ccw projected
  line L8 (-12.1249, -41.2824) -> (37.7646, -20.6175) projected
  arc A19 (37.7646, -20.6175) -> (38.847, -18.0044) centre (36.9993, -18.7698) ccw projected
  line L9 (38.847, -18.0044) -> (37.699, -15.2327) projected
  arc A20 (38.7814, -12.6196) -> (37.699, -15.2327) centre (39.5467, -14.4674) ccw projected
  line L10 (38.7814, -12.6196) -> (41.553, -11.4716) projected
  arc A21 (41.553, -11.4716) -> (42.6354, -8.8584) centre (40.7876, -9.6238) ccw projected
  line L11 (42.6354, -8.8584) -> (23.8839, 36.4117) projected
  arc A22 (23.8839, 36.4117) -> (21.2708, 37.494) centre (22.0362, 35.6463) ccw projected
  line L12 (21.2708, 37.494) -> (18.4992, 36.346) projected
  arc A23 (15.886, 37.4284) -> (18.4992, 36.346) centre (17.7338, 38.1938) ccw projected
  line L13 (15.886, 37.4284) -> (14.738, 40.2) projected
  arc A24 (14.738, 40.2) -> (12.1249, 41.2824) centre (12.8902, 39.4347) ccw projected
  line L14 (12.1249, 41.2824) -> (-1.7333, 35.5422) projected
  line L15 (-7.4079, 44.0156) -> (-25.8789, 36.346)
  line L16 (-25.8789, 36.346) -> (-22.0507, 27.1264)
  line L17 (-7.4079, 44.0156) -> (-3.5797, 34.796)
  line L18 (-3.5797, 34.796) -> (-22.0507, 27.1264)
extrude "돌출6" cut sketch "스케치9" against normal through all contours L17 L18 L16 L15
fillet "모깎기1" radius 2 4 edges at (25.8789, 36.346, 2) (22.0507, 27.1264, 2) (3.5797, 34.796, 2) (7.4079, 44.0156, 2)
sketch "스케치10" plane through (0, 0, 4) normal (0, 0, 1) x (1, 0, 0)
  line L0 (25.112, 34.4989) -> (22.8177, 28.9735) projected
  arc A0 (20.2036, 27.8934) -> (22.8177, 28.9735) centre (20.9706, 29.7405) ccw projected
  line L1 (20.2036, 27.8934) -> (5.4268, 34.0291) projected
  arc A1 (4.3467, 36.6431) -> (5.4268, 34.0291) centre (6.1938, 35.8762) ccw projected
  line L2 (4.3467, 36.6431) -> (6.641, 42.1685) projected
  arc A2 (9.255, 43.2486) -> (6.641, 42.1685) centre (8.4881, 41.4015) ccw projected
  line L3 (9.255, 43.2486) -> (24.0318, 37.113) projected
  arc A3 (25.112, 34.4989) -> (24.0318, 37.113) centre (23.2649, 35.2659) ccw projected
  circle A4 centre (22.6415, 9.3601) radius 1.2295 projected
  circle A5 centre (9.3601, -22.6415) radius 1.2295 projected
  circle A6 centre (-22.6415, -9.3601) radius 1.2295 projected
  circle A7 centre (-9.3601, 22.6415) radius 1.2295 projected
  circle A8 centre (47.1805, 19.5045) radius 2.5 projected
  circle A9 centre (-47.1805, -19.5045) radius 2.5 projected
  circle A10 centre (19.5045, -47.1805) radius 2.5 projected
  circle A11 centre (-19.5045, 47.1805) radius 2.5 projected
  circle A12 centre (-42.4264, -42.4264) radius 1.5 projected
  circle A13 centre (-42.4264, 42.4264) radius 1.5 projected
  circle A14 centre (42.4264, 42.4264) radius 1.5 projected
  circle A15 centre (42.4264, -42.4264) radius 1.5 projected
  circle A16 centre (60, 0) radius 1.5 projected
  circle A17 centre (0, 60) radius 1.5 projected
  circle A18 centre (-60, 0) radius 1.5 projected
  circle A19 centre (0, -60) radius 1.5 projected
  circle A20 centre (0, 0) radius 65 projected
  circle A21 centre (0, 0) radius 29 projected
  line L4 (0, 0) -> (59.5002, 0) construction
  circle A22 centre (18.9196, 15.5659) radius 1
  line L5 (18.9196, 15.5659) -> (0, 0)
  circle A23 centre (0, 0) radius 24.5 construction
  dimension "d96" = 2
extrude "돌출7" cut sketch "스케치10" against normal through all contours A22
properties part number "CPU면 철판가공"
